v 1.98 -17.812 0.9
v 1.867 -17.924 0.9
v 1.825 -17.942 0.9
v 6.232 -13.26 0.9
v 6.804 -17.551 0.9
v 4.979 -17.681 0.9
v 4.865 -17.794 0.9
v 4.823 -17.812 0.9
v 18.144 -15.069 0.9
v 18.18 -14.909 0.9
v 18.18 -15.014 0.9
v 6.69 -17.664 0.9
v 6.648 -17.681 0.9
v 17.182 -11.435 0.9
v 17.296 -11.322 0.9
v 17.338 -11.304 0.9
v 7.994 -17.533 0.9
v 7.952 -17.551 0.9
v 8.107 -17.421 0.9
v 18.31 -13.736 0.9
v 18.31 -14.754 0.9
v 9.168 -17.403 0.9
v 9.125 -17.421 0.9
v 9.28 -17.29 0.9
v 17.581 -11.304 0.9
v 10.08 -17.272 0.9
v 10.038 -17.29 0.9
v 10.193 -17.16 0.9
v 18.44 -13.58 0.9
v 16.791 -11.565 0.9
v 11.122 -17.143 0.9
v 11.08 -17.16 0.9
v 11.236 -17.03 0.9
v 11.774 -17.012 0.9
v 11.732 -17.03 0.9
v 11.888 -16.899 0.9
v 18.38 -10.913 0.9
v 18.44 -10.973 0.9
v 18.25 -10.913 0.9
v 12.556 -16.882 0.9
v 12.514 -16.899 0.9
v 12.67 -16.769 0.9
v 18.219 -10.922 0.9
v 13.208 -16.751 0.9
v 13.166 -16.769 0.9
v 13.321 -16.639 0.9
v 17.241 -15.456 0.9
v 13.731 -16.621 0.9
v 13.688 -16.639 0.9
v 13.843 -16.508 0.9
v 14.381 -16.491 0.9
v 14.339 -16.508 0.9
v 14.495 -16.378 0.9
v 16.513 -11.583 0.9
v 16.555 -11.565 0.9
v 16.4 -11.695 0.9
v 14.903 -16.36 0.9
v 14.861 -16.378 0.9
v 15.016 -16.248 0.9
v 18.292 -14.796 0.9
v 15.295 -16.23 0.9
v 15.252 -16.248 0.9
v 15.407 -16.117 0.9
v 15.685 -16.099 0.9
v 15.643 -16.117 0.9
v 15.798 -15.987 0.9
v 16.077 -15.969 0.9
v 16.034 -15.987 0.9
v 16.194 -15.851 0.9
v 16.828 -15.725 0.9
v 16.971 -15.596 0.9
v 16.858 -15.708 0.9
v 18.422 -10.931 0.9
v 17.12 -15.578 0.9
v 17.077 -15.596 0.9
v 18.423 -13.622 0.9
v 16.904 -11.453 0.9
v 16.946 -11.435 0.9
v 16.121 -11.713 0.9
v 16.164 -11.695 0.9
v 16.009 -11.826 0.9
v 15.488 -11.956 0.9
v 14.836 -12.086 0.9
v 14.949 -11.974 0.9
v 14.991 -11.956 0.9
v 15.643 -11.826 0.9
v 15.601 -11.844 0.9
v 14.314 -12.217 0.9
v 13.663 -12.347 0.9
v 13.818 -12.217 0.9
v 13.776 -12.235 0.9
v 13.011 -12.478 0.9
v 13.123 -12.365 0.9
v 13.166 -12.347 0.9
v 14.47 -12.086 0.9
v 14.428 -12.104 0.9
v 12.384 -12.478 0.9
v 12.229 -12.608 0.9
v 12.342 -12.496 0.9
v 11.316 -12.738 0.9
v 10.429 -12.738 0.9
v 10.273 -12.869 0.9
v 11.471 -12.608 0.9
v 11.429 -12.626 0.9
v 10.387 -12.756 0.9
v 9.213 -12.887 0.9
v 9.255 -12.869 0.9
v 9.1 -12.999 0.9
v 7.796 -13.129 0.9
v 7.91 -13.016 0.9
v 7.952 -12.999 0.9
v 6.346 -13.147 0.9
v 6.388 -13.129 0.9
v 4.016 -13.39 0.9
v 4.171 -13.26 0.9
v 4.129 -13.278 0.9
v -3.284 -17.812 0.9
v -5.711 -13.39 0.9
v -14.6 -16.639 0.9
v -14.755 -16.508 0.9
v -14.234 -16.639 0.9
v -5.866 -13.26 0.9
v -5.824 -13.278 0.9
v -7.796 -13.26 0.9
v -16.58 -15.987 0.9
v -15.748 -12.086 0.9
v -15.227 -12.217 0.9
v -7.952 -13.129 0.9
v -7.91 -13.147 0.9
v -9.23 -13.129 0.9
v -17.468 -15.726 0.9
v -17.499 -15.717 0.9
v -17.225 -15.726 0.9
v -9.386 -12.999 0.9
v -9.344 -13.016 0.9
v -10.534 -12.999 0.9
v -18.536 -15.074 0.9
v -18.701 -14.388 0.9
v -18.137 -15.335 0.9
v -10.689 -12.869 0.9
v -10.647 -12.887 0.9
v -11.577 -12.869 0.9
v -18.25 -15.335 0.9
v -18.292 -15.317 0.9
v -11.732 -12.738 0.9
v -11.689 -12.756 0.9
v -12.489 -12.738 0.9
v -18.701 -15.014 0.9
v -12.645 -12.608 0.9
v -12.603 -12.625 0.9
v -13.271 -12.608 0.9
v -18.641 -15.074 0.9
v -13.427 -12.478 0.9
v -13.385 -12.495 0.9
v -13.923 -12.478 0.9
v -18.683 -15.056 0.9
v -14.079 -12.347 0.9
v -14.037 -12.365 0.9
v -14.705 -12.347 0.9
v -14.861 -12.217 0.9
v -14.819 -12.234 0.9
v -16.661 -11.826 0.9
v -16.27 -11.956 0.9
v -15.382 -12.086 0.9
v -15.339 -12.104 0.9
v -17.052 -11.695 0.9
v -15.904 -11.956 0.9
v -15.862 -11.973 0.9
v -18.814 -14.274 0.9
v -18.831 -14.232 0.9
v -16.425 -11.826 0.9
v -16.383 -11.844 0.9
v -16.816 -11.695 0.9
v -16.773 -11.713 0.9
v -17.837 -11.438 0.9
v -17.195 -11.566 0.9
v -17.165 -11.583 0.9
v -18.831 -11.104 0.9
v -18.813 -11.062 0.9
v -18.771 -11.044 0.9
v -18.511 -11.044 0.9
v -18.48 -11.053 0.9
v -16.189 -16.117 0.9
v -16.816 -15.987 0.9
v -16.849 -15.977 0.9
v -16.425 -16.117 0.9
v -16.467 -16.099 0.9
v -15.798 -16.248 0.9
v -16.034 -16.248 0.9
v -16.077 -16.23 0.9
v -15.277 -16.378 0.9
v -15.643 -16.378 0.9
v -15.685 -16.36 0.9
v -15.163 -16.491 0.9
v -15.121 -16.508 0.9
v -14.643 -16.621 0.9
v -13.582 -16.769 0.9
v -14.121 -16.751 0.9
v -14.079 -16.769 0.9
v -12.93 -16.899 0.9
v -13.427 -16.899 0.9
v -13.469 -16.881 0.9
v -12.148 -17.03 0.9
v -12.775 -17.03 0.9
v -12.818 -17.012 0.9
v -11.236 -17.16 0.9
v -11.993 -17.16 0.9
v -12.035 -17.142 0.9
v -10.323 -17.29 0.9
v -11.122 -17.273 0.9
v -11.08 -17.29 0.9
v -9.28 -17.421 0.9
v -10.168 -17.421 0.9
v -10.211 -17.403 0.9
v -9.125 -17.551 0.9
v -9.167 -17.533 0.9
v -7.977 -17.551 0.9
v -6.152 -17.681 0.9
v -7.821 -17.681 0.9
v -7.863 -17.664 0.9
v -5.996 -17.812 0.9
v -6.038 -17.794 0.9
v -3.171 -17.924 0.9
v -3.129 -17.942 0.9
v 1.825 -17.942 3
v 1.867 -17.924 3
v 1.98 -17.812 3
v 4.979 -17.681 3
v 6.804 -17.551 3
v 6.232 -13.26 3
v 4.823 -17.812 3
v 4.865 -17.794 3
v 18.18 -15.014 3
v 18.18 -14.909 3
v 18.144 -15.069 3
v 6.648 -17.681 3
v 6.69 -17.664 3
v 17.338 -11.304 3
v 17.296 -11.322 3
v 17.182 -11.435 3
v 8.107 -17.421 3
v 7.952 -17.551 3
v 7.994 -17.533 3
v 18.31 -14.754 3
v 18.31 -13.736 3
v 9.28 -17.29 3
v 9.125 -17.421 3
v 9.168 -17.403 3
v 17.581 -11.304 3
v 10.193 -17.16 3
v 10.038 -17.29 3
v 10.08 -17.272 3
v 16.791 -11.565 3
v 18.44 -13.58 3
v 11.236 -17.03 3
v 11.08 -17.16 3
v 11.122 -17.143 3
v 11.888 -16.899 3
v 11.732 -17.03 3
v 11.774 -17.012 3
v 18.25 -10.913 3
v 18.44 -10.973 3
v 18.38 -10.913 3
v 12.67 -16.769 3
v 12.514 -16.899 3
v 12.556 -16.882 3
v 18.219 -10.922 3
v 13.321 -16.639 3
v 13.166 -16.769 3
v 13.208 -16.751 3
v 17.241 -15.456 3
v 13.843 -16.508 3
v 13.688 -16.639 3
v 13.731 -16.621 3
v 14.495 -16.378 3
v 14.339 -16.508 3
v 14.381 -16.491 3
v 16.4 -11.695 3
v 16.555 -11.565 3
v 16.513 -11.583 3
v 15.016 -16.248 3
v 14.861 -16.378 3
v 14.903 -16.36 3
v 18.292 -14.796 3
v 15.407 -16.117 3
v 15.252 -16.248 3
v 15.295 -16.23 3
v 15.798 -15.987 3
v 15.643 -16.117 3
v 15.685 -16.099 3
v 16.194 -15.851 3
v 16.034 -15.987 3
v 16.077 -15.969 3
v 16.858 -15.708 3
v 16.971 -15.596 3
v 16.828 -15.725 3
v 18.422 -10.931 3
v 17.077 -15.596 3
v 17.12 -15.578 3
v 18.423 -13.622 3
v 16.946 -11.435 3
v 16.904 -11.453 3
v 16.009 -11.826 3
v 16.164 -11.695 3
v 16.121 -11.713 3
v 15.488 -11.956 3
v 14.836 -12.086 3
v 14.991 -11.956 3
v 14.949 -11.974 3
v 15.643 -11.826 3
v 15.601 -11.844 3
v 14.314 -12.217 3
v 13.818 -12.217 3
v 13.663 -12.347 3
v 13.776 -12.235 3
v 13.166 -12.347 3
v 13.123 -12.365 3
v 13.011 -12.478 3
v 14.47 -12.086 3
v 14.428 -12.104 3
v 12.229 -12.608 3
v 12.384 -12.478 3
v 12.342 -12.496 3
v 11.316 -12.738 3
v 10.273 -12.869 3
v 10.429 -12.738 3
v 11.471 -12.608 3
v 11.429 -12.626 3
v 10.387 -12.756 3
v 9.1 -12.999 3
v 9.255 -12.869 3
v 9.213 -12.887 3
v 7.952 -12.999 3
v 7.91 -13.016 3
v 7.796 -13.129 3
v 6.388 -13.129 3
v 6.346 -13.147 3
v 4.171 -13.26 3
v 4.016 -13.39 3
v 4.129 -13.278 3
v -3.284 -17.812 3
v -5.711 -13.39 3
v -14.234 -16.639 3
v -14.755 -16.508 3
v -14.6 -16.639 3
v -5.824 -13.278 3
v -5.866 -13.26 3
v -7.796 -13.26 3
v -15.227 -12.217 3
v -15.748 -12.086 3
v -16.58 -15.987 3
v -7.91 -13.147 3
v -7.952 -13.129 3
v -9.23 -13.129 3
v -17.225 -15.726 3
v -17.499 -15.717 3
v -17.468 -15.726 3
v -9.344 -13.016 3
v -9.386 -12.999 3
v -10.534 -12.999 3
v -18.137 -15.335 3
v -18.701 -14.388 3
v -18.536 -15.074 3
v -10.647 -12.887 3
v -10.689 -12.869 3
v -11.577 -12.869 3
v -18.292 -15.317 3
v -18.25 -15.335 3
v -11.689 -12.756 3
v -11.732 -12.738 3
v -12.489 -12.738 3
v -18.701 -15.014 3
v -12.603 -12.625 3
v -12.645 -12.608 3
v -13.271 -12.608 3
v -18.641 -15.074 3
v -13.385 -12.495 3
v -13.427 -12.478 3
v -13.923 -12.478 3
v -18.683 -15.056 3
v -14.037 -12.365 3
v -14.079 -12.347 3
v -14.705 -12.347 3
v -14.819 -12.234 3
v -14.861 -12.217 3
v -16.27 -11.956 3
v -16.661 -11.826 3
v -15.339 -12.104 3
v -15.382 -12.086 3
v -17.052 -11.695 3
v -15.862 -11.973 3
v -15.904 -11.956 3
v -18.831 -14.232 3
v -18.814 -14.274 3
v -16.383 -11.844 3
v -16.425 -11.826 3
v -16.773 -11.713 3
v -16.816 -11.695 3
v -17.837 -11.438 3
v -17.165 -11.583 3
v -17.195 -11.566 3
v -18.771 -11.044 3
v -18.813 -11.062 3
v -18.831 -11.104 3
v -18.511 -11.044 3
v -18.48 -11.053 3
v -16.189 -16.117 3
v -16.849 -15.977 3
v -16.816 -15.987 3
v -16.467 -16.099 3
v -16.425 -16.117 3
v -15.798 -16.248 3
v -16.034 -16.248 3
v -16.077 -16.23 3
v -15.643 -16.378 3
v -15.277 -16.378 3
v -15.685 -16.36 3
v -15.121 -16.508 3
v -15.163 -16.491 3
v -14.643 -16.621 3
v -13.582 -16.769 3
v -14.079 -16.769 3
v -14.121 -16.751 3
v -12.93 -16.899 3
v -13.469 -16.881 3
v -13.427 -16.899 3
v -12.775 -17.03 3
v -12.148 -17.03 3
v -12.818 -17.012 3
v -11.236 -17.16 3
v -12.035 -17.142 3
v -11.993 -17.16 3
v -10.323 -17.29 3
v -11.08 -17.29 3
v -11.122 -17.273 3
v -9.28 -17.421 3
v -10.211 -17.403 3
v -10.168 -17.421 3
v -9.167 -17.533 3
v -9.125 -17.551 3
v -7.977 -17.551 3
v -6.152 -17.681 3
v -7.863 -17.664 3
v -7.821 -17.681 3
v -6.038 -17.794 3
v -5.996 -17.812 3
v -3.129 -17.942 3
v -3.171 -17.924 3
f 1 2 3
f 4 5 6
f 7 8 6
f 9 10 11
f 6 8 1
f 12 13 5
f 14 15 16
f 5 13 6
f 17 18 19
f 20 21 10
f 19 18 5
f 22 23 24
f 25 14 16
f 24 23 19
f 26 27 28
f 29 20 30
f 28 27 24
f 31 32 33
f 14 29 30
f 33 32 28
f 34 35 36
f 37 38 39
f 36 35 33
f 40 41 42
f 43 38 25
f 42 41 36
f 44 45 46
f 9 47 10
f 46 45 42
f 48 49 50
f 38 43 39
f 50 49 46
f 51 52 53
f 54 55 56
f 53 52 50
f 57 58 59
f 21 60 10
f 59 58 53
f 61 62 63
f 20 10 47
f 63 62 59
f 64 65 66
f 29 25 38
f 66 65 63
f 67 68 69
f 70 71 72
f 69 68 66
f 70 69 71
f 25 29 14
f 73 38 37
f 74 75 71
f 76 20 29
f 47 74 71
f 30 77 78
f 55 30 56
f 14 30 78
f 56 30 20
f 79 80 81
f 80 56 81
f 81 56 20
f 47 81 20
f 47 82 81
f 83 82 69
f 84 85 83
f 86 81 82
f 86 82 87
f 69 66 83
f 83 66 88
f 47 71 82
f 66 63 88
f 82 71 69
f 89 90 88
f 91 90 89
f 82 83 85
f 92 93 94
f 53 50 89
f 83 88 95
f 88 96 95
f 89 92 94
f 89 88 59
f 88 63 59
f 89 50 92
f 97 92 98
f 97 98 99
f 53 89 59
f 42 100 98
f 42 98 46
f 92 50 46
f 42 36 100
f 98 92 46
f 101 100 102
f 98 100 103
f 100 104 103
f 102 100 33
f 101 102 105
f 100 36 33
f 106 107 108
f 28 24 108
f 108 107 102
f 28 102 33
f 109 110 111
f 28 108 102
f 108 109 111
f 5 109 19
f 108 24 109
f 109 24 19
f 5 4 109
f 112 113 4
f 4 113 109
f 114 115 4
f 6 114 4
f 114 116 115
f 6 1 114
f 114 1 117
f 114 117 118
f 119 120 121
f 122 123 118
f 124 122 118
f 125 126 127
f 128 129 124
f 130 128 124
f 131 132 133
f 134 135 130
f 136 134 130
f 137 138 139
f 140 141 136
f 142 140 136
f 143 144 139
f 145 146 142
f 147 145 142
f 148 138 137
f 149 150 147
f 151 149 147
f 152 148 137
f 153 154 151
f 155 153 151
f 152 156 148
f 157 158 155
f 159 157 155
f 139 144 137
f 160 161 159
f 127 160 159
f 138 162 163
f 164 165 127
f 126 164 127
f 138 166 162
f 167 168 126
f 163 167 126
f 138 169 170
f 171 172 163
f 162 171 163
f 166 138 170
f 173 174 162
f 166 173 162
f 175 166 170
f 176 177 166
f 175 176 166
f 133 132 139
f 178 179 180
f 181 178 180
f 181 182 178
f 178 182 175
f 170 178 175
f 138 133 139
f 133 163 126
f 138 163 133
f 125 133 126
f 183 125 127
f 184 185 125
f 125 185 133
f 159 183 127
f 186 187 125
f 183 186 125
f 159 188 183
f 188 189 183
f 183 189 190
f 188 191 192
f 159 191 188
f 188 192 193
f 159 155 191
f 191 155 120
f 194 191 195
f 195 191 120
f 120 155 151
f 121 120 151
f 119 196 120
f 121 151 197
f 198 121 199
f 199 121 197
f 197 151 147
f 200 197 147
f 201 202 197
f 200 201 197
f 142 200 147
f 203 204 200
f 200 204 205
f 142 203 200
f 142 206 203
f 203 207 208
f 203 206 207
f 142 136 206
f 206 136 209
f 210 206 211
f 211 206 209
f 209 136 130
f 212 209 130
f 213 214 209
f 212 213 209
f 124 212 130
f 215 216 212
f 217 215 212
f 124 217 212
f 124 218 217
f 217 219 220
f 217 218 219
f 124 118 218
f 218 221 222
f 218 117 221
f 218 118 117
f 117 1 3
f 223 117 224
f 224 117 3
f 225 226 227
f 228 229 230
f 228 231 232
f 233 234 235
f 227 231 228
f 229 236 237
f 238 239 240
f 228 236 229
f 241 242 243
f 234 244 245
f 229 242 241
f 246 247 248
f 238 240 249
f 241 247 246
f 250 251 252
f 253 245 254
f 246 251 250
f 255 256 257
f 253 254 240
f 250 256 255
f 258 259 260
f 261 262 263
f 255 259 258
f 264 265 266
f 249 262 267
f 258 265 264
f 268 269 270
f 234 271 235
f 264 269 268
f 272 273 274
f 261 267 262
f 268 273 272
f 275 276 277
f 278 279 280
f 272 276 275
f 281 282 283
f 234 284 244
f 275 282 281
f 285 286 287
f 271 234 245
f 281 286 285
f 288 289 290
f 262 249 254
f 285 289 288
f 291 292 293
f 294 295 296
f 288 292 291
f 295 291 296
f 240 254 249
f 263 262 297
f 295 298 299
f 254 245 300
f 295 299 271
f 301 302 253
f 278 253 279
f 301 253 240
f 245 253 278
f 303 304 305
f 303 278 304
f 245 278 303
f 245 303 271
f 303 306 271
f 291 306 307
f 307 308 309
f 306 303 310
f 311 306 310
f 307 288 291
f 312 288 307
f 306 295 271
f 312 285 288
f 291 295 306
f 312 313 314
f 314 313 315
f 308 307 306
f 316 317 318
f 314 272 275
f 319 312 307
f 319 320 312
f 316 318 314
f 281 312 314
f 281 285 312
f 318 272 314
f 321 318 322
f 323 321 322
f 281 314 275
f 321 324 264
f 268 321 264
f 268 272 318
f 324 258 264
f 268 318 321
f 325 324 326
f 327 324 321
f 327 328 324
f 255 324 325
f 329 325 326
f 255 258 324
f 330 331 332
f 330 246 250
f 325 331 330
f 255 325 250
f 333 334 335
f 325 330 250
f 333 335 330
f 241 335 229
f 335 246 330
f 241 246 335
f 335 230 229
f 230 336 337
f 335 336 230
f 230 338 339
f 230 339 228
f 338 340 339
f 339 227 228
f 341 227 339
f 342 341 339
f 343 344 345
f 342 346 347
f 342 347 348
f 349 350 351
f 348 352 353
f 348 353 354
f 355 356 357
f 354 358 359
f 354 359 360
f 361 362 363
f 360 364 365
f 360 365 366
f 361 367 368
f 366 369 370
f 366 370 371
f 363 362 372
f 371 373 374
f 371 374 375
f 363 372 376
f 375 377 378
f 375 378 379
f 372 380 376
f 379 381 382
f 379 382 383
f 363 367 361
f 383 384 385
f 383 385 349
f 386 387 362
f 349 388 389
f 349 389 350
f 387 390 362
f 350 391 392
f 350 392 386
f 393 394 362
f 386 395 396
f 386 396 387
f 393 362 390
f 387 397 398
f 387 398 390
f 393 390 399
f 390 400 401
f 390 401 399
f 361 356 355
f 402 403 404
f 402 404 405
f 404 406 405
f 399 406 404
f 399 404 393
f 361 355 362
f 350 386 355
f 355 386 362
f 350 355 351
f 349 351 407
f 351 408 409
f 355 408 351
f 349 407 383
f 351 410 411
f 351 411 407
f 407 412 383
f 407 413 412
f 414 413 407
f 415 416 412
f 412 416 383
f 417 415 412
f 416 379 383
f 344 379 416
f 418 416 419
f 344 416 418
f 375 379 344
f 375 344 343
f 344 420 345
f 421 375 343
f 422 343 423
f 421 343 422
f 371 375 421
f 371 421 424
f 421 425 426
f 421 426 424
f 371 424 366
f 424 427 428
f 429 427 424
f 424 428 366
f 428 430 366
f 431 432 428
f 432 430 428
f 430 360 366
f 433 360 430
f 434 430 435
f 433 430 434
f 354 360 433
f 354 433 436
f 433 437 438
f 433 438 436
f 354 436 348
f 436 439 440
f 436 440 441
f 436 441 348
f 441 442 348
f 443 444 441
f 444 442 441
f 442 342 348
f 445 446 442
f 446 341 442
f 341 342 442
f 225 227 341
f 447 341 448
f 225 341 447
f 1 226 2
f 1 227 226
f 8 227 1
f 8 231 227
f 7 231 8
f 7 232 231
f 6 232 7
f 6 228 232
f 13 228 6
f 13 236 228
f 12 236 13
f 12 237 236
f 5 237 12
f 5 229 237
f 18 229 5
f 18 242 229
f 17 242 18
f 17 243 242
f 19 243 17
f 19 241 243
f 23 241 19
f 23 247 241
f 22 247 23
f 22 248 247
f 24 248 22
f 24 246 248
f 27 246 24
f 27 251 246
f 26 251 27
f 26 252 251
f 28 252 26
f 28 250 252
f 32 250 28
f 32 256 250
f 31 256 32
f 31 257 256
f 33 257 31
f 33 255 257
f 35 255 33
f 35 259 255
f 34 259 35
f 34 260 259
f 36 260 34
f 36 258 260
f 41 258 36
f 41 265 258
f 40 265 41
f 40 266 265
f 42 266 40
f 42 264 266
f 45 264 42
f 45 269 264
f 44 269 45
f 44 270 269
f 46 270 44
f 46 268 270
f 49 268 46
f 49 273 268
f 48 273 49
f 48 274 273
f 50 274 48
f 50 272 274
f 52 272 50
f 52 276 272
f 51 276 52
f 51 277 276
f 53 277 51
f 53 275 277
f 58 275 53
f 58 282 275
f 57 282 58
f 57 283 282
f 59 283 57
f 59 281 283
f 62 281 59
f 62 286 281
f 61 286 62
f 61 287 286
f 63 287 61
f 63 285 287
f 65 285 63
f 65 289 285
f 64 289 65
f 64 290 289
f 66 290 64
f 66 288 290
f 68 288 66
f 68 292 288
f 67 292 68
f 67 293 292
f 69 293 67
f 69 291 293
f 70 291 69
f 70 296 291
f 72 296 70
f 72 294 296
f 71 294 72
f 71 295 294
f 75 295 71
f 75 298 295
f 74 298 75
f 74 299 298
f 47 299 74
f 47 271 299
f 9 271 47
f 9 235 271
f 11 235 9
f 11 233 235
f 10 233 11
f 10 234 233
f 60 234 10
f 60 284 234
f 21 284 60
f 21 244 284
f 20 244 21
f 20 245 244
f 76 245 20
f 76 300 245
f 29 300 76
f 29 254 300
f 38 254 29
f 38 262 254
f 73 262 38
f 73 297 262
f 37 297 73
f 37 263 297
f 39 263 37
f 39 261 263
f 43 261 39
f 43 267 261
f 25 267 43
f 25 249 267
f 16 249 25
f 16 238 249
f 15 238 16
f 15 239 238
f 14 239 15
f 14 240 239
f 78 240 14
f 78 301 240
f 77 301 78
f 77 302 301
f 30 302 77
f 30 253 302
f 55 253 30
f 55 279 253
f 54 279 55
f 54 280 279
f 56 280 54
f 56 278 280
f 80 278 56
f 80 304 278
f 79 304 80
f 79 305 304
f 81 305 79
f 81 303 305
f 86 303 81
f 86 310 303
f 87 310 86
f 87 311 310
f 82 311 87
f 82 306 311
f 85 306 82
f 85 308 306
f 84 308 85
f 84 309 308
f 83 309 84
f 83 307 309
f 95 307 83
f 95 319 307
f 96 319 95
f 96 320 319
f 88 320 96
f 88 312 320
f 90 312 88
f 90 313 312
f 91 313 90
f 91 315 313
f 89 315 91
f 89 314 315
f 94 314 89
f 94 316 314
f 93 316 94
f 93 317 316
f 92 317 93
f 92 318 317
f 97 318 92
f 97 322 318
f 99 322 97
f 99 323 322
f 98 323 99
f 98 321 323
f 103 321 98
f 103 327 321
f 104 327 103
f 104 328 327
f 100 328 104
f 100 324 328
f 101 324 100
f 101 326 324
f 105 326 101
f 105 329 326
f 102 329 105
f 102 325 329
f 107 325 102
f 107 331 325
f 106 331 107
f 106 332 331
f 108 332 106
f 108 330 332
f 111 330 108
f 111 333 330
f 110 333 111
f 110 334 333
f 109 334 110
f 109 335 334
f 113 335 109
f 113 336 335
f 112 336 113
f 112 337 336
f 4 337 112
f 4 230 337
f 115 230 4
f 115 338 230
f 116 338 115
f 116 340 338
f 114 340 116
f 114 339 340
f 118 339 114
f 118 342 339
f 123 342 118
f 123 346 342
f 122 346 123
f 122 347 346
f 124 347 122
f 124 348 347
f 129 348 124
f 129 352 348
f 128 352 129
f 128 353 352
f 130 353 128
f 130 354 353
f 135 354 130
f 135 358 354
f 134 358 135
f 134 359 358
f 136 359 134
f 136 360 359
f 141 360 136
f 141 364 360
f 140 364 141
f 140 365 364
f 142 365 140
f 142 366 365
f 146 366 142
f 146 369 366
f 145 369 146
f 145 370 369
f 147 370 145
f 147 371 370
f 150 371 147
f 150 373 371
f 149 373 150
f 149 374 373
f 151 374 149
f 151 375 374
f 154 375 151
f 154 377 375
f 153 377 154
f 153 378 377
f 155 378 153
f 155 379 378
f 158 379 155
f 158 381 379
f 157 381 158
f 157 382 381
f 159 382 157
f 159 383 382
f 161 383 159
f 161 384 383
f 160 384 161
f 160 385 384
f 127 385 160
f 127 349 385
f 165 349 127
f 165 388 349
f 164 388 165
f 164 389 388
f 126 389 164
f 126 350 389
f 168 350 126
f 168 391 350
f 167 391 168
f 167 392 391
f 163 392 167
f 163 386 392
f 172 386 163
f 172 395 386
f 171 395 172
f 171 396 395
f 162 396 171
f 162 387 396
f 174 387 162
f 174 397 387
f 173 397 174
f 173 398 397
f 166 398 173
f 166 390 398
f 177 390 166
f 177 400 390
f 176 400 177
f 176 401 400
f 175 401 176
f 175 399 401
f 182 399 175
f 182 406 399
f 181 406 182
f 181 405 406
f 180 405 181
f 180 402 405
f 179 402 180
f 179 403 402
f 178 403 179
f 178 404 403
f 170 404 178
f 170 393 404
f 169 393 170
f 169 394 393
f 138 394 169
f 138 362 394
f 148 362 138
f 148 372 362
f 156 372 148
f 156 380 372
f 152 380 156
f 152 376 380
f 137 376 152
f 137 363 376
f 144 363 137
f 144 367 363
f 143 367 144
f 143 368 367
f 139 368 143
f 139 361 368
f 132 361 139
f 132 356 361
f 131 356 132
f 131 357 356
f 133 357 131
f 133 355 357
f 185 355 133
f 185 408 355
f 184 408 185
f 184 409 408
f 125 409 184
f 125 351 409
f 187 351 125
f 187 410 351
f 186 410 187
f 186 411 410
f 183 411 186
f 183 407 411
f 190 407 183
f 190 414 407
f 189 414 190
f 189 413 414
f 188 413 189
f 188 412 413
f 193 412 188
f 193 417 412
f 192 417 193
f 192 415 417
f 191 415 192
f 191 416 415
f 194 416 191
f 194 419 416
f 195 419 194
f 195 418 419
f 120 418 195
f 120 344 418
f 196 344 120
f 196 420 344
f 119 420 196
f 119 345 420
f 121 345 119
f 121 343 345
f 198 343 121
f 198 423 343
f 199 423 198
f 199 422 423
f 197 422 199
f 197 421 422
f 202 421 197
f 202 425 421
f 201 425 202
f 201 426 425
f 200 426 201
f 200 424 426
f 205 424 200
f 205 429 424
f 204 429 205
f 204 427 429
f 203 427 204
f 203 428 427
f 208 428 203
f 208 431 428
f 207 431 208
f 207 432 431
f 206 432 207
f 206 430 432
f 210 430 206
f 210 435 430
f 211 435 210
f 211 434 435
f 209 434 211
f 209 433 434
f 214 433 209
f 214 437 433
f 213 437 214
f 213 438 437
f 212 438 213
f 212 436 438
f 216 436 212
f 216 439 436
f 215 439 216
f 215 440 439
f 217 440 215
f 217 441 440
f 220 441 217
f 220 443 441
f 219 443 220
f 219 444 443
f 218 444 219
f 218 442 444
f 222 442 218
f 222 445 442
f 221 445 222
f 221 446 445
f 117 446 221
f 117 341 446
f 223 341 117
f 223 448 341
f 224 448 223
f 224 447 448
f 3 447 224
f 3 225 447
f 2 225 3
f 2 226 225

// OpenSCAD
$fn = 24;
translate([0, -2.500, 0.900])
  linear_extrude(height=2.100) {
offset(r=0.06, $fn=8) {
    polygon(points=[[18.380,-8.473],[18.250,-8.473],[17.598,-8.864],[17.338,-8.864],[17.207,-8.995],[16.946,-8.995],[16.816,-9.125],[16.555,-9.125],[16.425,-9.255],[16.164,-9.255],[16.034,-9.386],[15.643,-9.386],[15.513,-9.516],[14.991,-9.516],[14.861,-9.646],[14.470,-9.646],[14.339,-9.777],[13.818,-9.777],[13.688,-9.907],[13.166,-9.907],[13.036,-10.038],[12.384,-10.038],[12.254,-10.168],[11.471,-10.168],[11.341,-10.298],[10.429,-10.298],[10.298,-10.429],[9.255,-10.429],[9.125,-10.559],[7.952,-10.559],[7.821,-10.689],[6.388,-10.689],[6.257,-10.820],[4.171,-10.820],[4.041,-10.950],[-5.736,-10.950],[-5.866,-10.820],[-7.821,-10.820],[-7.952,-10.689],[-9.255,-10.689],[-9.386,-10.559],[-10.559,-10.559],[-10.689,-10.429],[-11.602,-10.429],[-11.732,-10.298],[-12.514,-10.298],[-12.645,-10.168],[-13.296,-10.168],[-13.427,-10.038],[-13.948,-10.038],[-14.079,-9.907],[-14.730,-9.907],[-14.861,-9.777],[-15.252,-9.777],[-15.382,-9.646],[-15.773,-9.646],[-15.904,-9.516],[-16.295,-9.516],[-16.425,-9.386],[-16.686,-9.386],[-16.816,-9.255],[-17.077,-9.255],[-17.207,-9.125],[-17.859,-8.995],[-18.511,-8.604],[-18.771,-8.604],[-18.771,-11.732],[-18.641,-11.863],[-18.641,-12.514],[-18.511,-12.514],[-18.250,-12.775],[-18.120,-12.775],[-17.468,-13.166],[-17.207,-13.166],[-16.816,-13.427],[-16.555,-13.427],[-16.425,-13.557],[-16.164,-13.557],[-16.034,-13.688],[-15.773,-13.688],[-15.643,-13.818],[-15.252,-13.818],[-15.121,-13.948],[-14.730,-13.948],[-14.600,-14.079],[-14.209,-14.079],[-14.079,-14.209],[-13.557,-14.209],[-13.427,-14.339],[-12.905,-14.339],[-12.775,-14.470],[-12.123,-14.470],[-11.993,-14.600],[-11.211,-14.600],[-11.080,-14.730],[-10.298,-14.730],[-10.168,-14.861],[-9.255,-14.861],[-9.125,-14.991],[-7.952,-14.991],[-7.821,-15.121],[-6.127,-15.121],[-5.996,-15.252],[-3.259,-15.252],[-3.129,-15.382],[1.825,-15.382],[1.955,-15.252],[4.823,-15.252],[4.954,-15.121],[6.648,-15.121],[6.779,-14.991],[7.952,-14.991],[8.082,-14.861],[9.125,-14.861],[9.255,-14.730],[10.038,-14.730],[10.168,-14.600],[11.080,-14.600],[11.211,-14.470],[11.732,-14.470],[11.863,-14.339],[12.514,-14.339],[12.645,-14.209],[13.166,-14.209],[13.296,-14.079],[13.688,-14.079],[13.818,-13.948],[14.339,-13.948],[14.470,-13.818],[14.861,-13.818],[14.991,-13.688],[15.252,-13.688],[15.382,-13.557],[15.643,-13.557],[15.773,-13.427],[16.034,-13.427],[16.164,-13.296],[16.816,-13.166],[16.946,-13.036],[17.077,-13.036],[17.207,-12.905],[18.120,-12.514],[18.120,-12.384],[18.250,-12.254],[18.250,-11.211],[18.380,-11.080]], paths=[[0,1,2,3,4,5,6,7,8,9,10,11,12,13,14,15,16,17,18,19,20,21,22,23,24,25,26,27,28,29,30,31,32,33,34,35,36,37,38,39,40,41,42,43,44,45,46,47,48,49,50,51,52,53,54,55,56,57,58,59,60,61,62,63,64,65,66,67,68,69,70,71,72,73,74,75,76,77,78,79,80,81,82,83,84,85,86,87,88,89,90,91,92,93,94,95,96,97,98,99,100,101,102,103,104,105,106,107,108,109,110,111,112,113,114,115,116,117,118,119,120,121,122,123,124,125,126,127,128,129,130,131,132,133,134,135,136,137,138,139,140,141,142,143,144,145]]);
}
}
